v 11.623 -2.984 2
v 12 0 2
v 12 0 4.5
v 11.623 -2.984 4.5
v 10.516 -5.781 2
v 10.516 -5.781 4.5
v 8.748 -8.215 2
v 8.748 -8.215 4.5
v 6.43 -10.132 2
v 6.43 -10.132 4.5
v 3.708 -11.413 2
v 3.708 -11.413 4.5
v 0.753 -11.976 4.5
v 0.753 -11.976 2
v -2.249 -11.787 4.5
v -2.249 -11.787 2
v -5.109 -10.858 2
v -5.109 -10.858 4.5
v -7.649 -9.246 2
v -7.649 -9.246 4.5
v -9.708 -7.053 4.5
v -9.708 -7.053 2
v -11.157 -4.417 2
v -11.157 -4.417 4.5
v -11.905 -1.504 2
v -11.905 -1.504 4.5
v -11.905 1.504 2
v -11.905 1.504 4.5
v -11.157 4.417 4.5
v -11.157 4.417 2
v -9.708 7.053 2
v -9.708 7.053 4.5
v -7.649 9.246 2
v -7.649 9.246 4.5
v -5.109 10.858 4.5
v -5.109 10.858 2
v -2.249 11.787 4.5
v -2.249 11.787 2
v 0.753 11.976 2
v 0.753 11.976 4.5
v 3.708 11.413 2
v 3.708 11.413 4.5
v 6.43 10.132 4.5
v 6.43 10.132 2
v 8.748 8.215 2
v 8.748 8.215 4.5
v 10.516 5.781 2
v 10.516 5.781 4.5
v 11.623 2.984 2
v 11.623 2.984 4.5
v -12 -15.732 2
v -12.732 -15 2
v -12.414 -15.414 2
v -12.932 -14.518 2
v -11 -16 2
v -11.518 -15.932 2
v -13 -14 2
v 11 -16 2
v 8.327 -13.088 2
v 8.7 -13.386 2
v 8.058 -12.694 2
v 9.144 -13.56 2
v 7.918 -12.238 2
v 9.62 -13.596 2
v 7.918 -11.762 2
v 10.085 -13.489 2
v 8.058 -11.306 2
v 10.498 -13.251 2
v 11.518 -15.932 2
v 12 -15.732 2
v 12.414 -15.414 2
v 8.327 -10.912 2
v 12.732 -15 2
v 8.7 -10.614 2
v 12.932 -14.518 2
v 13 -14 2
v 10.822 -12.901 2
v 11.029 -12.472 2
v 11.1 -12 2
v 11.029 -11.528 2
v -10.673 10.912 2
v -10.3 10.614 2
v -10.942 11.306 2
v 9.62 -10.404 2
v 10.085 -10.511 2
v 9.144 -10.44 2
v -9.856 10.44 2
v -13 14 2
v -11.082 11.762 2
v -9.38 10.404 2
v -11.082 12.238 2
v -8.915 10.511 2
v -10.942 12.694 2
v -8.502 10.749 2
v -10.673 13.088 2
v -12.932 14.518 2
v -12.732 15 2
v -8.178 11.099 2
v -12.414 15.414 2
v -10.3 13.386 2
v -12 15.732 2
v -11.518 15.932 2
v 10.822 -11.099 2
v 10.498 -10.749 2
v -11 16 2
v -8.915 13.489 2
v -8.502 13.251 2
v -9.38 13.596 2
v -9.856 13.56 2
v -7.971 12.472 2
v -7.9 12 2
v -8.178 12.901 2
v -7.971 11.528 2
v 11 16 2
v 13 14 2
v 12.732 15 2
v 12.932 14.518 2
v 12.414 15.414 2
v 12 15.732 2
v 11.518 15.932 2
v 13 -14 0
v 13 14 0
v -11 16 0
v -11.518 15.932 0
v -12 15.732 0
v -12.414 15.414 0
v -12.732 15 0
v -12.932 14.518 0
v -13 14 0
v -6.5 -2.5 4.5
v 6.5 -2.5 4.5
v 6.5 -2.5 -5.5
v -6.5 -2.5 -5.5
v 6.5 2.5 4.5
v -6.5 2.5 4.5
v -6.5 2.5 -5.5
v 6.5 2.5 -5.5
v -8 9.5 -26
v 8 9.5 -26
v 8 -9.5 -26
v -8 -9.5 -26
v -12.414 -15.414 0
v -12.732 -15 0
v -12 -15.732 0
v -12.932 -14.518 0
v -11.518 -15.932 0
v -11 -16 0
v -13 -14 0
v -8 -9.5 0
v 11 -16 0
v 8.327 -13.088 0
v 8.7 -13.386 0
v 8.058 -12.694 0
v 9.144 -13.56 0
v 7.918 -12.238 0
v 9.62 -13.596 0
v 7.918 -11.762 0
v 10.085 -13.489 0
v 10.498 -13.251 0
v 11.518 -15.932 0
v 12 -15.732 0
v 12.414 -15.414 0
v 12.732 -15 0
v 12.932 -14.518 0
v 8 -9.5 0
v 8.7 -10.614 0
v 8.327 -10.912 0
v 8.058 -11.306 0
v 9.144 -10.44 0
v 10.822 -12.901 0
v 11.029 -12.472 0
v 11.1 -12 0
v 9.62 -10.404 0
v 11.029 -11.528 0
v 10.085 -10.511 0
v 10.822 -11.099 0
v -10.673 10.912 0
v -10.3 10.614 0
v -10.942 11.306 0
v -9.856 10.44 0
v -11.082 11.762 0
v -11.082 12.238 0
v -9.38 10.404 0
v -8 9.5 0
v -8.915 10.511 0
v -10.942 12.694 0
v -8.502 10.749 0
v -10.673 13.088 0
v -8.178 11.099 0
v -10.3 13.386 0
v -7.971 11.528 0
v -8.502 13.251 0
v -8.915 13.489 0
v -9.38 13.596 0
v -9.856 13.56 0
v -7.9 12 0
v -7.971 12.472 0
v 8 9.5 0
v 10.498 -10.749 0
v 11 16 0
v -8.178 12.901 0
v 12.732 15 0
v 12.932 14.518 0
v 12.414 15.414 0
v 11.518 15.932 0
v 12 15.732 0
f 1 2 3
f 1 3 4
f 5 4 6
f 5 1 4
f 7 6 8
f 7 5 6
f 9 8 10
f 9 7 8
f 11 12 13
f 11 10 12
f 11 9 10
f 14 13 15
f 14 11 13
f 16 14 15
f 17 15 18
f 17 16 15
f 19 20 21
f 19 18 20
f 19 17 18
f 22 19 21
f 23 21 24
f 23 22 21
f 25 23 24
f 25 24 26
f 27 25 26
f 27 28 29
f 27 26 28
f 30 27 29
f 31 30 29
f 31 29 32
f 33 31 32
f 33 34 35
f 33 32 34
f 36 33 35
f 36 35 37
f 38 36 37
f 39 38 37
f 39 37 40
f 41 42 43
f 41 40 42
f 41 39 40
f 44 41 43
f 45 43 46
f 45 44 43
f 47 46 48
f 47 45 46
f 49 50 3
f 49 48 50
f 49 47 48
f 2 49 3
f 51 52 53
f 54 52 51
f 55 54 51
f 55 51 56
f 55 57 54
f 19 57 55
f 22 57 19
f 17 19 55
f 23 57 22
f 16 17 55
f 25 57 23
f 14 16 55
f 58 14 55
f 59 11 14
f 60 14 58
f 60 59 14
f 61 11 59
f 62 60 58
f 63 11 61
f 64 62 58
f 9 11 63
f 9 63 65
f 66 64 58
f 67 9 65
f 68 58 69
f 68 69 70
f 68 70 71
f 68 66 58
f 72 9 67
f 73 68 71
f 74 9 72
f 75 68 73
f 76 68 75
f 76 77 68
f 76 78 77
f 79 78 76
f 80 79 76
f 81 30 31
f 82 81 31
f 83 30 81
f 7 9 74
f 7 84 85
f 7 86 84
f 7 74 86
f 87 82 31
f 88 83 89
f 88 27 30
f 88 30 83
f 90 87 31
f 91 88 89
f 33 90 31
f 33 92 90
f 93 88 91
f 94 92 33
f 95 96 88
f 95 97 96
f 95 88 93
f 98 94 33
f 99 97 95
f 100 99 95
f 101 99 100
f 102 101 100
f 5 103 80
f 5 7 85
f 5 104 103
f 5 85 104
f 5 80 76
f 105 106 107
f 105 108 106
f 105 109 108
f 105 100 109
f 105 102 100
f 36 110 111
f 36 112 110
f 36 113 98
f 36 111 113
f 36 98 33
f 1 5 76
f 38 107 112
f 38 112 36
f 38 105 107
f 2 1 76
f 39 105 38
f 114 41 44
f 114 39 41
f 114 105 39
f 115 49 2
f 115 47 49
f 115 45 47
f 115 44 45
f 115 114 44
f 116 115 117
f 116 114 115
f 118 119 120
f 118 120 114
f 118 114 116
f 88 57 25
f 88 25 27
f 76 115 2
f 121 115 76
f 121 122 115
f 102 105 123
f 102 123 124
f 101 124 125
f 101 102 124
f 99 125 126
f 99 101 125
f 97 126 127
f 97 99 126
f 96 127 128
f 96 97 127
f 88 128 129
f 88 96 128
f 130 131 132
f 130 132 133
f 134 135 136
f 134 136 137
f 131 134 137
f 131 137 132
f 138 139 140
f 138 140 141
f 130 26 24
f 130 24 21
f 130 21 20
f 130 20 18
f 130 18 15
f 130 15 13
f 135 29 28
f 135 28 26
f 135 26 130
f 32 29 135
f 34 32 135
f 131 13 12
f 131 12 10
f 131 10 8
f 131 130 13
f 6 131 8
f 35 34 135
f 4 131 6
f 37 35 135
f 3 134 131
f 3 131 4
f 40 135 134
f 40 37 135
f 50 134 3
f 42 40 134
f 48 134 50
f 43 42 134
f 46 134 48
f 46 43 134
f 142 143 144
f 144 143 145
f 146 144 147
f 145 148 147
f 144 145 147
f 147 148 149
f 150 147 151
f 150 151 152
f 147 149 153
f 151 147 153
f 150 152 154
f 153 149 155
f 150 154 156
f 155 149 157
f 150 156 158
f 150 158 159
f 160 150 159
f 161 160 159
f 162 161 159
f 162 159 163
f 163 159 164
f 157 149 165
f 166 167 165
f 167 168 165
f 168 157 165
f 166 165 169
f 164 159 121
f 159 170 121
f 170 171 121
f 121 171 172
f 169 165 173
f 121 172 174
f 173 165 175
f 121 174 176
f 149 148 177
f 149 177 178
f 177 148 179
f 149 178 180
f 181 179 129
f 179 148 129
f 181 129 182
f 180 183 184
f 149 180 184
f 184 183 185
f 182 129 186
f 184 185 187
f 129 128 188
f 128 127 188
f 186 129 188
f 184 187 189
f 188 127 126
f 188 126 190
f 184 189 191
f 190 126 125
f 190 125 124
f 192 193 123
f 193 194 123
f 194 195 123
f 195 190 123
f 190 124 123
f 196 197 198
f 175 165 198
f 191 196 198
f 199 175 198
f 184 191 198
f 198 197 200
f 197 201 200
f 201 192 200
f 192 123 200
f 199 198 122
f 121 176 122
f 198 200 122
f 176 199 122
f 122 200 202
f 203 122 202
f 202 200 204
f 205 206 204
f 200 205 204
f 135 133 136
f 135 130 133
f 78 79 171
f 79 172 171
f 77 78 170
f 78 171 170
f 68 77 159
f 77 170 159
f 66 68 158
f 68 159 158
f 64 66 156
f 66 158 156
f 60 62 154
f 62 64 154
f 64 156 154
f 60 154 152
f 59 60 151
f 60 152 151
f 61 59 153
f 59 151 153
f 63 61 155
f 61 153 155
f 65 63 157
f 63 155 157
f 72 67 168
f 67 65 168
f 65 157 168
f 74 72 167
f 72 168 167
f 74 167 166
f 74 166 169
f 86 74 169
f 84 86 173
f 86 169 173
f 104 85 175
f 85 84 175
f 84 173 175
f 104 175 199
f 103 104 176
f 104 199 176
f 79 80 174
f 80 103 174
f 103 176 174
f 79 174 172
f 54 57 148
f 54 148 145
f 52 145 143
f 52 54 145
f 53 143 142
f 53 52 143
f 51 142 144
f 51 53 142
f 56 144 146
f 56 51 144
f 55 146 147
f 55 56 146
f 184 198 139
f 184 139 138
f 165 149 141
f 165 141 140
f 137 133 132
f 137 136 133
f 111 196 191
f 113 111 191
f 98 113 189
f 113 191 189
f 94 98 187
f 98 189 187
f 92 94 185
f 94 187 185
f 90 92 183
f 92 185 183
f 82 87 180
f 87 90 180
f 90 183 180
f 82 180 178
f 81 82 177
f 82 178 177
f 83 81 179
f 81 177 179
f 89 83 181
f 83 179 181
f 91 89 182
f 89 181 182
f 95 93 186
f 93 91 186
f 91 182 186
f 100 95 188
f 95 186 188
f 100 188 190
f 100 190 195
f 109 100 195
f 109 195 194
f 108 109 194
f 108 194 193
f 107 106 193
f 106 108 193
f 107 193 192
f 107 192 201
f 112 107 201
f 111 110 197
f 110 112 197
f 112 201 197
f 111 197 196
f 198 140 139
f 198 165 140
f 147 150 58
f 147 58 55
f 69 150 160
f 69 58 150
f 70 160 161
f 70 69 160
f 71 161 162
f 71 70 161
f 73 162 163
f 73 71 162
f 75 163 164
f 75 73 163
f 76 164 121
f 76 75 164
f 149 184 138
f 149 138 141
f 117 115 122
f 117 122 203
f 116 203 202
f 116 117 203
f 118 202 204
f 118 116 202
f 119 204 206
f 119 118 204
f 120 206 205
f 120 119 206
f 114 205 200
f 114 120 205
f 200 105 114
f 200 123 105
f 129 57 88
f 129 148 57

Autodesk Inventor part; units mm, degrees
ref_plane "YZ Plane" through (0, 0, 0) normal (1, 0, 0) x (0, 1, 0)
ref_plane "XZ Plane" through (0, 0, 0) normal (0, 1, 0) x (-1, 0, 0)
ref_plane "XY Plane" through (0, 0, 0) normal (0, 0, 1) x (1, 0, 0)
sketch "Sketch1" plane through (0, 0, 0) normal (0, 0, 1) x (1, 0, 0)
  line L0 (13, -16) -> (-13, -16)
  line L1 (-13, -16) -> (-13, 16)
  line L2 (-13, 16) -> (13, 16)
  line L3 (13, 16) -> (13, -16)
  line L4 (13, -16) -> (-13, 16) construction
  line L5 (-13, -16) -> (13, 16) construction
  circle A0 centre (-9.5, 12) radius 1.6
  circle A1 centre (9.5, -12) radius 1.6
  point P0 (0, 0)
  dimension "d0" = 32
  dimension "d1" = 26
  dimension "d3" = 12
  dimension "d4" = 12
  dimension "d5" = 9.5
  dimension "d6" = 9.5
  dimension "d7" = 3.2
extrude "Extrusion1" add sketch "Sketch1" along normal blind 2
sketch "Sketch2" plane through (0, 0, 2) normal (0, 0, 1) x (1, 0, 0)
  circle A0 centre (0, 0) radius 12
  dimension "d10" = 24
extrude "Extrusion2" add sketch "Sketch2" along normal blind 2.5
fillet "Fillet1" radius 2 4 edges at (-13, 16, 1) (13, 16, 1) (-13, -16, 1) (13, -16, 1)
sketch "Sketch3" plane through (0, 0, 0) normal (0, 0, -1) x (-1, 0, 0)
  line L0 (8, -9.5) -> (-8, -9.5)
  line L1 (-8, -9.5) -> (-8, 9.5)
  line L2 (-8, 9.5) -> (8, 9.5)
  line L3 (8, 9.5) -> (8, -9.5)
  line L4 (8, -9.5) -> (-8, 9.5) construction
  line L5 (-8, -9.5) -> (8, 9.5) construction
  point P0 (0, 0)
  dimension "d14" = 19
  dimension "d15" = 16
extrude "Extrusion3" add sketch "Sketch3" along normal blind 26
sketch "Sketch4" plane through (0, 0, 4.5) normal (0, 0, 1) x (1, 0, 0)
  line L0 (6.5, -2.5) -> (-6.5, -2.5)
  line L1 (-6.5, -2.5) -> (-6.5, 2.5)
  line L2 (-6.5, 2.5) -> (6.5, 2.5)
  line L3 (6.5, 2.5) -> (6.5, -2.5)
  line L4 (6.5, -2.5) -> (-6.5, 2.5) construction
  line L5 (-6.5, -2.5) -> (6.5, 2.5) construction
  point P0 (0, 0)
  dimension "d18" = 13
  dimension "d19" = 5
extrude "Extrusion4" cut sketch "Sketch4" against normal blind 10
equation "\"d4\" = d3"
equation "\"d6\" = d5"
properties part number "Delock Panel Connector" material "Aluminum 6061"
